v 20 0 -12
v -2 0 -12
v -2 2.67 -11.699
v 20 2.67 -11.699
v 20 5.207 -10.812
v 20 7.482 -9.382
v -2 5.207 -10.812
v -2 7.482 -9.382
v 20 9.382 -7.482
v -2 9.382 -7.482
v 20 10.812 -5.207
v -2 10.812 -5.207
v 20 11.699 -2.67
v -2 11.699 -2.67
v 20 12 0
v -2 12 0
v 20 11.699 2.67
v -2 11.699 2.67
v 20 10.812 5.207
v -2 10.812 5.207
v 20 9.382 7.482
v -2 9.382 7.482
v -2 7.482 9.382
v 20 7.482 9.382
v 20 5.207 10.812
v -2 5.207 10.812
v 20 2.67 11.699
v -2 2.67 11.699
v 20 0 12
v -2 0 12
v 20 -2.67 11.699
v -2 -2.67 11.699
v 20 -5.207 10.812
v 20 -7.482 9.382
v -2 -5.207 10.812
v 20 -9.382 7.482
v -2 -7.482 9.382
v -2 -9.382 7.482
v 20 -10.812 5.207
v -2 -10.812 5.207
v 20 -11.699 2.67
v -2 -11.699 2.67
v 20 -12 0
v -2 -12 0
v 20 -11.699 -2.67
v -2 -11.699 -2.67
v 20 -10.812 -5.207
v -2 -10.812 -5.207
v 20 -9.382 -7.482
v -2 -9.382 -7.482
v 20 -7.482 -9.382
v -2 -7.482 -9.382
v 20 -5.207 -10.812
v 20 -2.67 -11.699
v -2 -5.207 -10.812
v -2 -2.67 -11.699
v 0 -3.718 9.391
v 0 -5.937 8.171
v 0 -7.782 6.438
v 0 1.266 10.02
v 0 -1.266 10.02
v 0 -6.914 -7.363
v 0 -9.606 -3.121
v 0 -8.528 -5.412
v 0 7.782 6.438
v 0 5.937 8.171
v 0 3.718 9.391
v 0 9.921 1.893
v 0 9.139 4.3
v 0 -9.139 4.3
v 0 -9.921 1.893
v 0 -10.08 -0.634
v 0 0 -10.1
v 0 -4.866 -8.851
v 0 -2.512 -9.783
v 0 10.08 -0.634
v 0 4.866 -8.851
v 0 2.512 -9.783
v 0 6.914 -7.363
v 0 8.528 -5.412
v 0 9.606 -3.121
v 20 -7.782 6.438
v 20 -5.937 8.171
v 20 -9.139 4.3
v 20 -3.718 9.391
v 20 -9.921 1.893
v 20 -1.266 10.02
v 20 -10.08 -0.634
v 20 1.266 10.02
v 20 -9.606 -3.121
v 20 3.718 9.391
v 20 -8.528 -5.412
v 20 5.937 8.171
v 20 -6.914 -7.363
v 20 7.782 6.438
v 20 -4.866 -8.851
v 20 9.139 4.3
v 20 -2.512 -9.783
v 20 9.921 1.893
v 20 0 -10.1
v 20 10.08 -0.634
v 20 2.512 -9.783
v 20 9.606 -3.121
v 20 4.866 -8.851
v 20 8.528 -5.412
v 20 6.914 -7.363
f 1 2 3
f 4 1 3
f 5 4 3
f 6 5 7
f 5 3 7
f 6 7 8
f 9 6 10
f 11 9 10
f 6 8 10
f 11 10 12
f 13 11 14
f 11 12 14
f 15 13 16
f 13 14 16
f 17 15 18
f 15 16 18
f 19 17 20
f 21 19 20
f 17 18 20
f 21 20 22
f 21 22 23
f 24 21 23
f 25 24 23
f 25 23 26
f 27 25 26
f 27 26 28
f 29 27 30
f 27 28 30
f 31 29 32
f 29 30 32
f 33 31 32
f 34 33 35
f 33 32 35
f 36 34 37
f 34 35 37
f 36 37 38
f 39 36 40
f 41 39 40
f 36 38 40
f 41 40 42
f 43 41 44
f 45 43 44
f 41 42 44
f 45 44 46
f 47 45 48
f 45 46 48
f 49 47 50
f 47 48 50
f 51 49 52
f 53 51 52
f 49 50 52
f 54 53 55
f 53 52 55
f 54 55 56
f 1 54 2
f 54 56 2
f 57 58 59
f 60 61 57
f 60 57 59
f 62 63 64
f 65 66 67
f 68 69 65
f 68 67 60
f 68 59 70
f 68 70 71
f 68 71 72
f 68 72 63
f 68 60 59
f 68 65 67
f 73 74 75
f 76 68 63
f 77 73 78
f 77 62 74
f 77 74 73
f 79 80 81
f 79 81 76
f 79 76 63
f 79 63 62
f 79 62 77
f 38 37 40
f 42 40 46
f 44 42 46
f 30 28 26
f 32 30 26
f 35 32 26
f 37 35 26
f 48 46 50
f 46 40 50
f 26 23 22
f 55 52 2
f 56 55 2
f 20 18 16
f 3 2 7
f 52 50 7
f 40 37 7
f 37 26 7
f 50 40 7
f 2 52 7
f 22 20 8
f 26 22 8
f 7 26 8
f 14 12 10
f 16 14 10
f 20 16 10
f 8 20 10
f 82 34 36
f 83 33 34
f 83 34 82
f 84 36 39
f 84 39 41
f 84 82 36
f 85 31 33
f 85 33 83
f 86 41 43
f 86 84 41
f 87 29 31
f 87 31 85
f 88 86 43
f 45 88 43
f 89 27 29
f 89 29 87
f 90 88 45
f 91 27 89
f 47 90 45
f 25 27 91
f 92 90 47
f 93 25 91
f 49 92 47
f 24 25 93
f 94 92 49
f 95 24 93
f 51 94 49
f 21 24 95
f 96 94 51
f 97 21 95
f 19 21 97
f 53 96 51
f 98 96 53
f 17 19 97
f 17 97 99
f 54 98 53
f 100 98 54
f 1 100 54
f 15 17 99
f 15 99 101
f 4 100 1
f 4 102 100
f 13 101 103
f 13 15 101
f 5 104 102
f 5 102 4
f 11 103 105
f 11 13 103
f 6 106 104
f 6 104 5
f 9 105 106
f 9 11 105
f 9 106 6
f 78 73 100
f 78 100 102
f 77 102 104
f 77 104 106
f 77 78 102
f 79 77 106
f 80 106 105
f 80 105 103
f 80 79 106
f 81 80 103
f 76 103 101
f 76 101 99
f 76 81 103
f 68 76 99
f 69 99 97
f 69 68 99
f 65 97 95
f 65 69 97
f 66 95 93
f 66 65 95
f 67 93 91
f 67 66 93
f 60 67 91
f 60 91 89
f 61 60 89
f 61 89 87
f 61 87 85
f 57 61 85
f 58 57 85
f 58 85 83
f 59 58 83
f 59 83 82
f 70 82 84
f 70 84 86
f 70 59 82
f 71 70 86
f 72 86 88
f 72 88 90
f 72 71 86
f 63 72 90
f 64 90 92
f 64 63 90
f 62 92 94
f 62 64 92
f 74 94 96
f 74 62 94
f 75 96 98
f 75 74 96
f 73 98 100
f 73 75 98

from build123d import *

# Parameters (mm, degrees)
CYLINDER_R              = 10.1
CYLINDER_DEPTH          = 20
CYLINDER_PITCH_ANGLE    = 90
CYLINDER001_R           = 12
CYLINDER001_DEPTH       = 22
CYLINDER001_PITCH_ANGLE = 90


with BuildPart() as cylinder:
    # Cylinder → Cylinder (new body)
    with BuildSketch(Plane.XY):
        Circle(CYLINDER_R)
    extrude(amount=CYLINDER_DEPTH)


with BuildPart() as cylinder_1:
    # Cylinder pitch: moved
    add(cylinder.part.rotate(Axis((0, 0, 0), (0, 1, 0)), CYLINDER_PITCH_ANGLE))


with BuildPart() as cylinder_2:
    # Cylinder placement: moved
    add(cylinder_1.part)


with BuildPart() as cut:
    # Cylinder001 → Cylinder001 (new body)
    with BuildSketch(Plane.XY):
        Circle(CYLINDER001_R)
    extrude(amount=CYLINDER001_DEPTH)


with BuildPart() as cut_1:
    # Cylinder001 pitch: moved
    add(cut.part.rotate(Axis((0, 0, 0), (0, 1, 0)), CYLINDER001_PITCH_ANGLE))


with BuildPart() as cut_2:
    # Cylinder001 placement: moved
    add(cut_1.part.moved(Location((-2, 0, 0))))

    # Cut: cut Cylinder
    add(cylinder_2.part, mode=Mode.SUBTRACT)


solid = cut_2.part
